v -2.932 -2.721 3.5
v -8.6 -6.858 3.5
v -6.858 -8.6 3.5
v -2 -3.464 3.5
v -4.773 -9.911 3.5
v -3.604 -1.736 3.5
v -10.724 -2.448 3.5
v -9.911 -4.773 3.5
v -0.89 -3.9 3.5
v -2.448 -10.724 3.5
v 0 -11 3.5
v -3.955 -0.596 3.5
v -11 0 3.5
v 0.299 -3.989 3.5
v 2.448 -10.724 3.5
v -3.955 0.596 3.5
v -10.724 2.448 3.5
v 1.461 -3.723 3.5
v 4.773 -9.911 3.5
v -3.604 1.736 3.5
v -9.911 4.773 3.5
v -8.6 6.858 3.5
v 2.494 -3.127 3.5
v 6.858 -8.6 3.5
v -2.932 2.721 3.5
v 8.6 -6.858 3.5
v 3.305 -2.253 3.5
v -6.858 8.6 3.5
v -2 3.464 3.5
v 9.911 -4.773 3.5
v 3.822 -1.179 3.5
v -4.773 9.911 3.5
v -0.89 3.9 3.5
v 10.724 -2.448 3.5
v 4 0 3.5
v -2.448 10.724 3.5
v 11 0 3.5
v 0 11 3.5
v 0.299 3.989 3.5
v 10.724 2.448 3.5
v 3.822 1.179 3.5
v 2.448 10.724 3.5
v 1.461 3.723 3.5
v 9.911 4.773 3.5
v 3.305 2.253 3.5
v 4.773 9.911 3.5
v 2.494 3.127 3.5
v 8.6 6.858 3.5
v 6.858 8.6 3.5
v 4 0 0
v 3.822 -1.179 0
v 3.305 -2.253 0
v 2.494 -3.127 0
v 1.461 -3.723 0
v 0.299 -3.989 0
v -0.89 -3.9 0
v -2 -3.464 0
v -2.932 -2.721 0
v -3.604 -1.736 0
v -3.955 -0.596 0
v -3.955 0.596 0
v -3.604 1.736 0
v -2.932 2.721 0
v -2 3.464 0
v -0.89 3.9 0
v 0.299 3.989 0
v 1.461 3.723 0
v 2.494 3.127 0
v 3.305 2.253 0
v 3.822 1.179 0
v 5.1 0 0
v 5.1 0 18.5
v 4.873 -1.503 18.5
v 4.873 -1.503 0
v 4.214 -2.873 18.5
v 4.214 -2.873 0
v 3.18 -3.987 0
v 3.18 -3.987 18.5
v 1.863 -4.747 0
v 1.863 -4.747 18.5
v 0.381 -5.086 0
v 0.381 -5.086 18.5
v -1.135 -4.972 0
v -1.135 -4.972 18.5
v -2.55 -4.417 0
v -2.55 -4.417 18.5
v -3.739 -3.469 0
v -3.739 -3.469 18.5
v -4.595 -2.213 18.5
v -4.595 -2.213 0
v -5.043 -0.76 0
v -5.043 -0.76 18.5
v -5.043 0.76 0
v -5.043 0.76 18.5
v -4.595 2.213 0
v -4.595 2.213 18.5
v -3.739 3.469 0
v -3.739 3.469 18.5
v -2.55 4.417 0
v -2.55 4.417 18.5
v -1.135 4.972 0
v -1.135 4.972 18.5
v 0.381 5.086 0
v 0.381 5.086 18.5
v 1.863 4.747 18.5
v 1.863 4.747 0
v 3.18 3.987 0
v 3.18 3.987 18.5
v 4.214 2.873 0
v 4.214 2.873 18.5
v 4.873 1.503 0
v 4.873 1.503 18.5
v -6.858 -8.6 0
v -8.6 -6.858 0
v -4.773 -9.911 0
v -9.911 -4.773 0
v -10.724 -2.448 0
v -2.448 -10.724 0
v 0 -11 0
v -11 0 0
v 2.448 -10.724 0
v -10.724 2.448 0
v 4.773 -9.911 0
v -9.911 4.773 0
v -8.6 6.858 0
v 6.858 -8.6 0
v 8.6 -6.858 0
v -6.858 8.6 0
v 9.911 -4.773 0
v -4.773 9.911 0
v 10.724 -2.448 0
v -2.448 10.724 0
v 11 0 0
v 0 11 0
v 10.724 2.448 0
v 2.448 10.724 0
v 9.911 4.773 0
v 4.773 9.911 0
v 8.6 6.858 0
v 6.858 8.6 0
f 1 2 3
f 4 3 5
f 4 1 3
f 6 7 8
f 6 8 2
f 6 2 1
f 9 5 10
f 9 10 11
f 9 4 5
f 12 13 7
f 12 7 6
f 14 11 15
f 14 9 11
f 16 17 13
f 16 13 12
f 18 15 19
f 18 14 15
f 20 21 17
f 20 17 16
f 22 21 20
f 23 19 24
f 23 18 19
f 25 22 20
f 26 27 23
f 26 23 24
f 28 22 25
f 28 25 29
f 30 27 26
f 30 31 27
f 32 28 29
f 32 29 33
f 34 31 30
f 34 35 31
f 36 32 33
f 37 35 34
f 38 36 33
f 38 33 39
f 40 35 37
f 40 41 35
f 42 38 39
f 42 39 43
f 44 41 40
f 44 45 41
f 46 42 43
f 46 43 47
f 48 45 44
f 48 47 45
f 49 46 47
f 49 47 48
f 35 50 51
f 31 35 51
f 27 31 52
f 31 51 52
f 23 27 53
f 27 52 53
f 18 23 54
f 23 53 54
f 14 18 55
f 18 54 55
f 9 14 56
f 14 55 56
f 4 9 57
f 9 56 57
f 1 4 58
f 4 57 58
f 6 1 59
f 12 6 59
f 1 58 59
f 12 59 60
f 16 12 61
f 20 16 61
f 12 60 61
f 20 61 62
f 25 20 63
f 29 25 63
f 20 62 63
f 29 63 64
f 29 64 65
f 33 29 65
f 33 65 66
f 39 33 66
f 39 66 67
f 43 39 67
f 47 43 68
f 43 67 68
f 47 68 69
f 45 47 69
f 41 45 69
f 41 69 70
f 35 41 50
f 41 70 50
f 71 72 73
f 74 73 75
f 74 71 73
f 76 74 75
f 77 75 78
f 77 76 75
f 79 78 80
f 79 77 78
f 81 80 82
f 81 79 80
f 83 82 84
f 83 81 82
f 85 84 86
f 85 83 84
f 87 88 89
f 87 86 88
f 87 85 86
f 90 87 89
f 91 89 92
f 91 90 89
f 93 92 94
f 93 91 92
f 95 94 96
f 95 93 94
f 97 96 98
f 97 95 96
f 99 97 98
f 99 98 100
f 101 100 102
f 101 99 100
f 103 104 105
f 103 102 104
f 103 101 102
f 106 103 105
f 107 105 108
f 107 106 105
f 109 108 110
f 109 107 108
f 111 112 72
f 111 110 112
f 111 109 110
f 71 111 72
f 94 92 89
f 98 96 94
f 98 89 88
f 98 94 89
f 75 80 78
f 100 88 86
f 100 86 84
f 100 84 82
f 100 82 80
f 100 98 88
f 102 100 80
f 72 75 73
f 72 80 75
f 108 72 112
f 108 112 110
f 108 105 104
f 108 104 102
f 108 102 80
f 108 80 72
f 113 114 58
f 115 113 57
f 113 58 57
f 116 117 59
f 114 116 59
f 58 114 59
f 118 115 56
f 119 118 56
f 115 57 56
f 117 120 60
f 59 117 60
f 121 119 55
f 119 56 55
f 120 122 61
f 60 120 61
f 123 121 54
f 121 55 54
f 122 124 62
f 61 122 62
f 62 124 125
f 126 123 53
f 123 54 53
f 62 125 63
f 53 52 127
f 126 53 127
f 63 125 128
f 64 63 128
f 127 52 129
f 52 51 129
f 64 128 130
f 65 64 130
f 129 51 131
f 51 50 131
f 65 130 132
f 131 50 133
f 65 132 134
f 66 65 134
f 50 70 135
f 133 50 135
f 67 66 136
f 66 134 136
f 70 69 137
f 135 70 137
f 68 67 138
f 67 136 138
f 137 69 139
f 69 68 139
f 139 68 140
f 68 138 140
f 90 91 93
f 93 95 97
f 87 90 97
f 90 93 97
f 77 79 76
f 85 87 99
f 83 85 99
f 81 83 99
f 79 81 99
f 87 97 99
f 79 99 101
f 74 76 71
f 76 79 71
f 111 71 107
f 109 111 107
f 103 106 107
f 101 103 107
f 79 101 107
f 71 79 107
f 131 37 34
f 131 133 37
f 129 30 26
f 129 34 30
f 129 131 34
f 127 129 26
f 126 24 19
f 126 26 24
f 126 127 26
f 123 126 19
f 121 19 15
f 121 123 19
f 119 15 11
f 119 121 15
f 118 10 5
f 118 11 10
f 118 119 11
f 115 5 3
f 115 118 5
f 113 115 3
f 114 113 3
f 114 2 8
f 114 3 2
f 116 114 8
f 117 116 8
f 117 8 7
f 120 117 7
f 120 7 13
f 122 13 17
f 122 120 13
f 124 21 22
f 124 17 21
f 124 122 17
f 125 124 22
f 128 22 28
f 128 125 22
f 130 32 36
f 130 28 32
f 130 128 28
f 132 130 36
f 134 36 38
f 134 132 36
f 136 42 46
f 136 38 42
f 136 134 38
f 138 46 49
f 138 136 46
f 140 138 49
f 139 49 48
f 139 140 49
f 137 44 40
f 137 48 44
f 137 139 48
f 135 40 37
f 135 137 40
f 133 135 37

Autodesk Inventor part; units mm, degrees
ref_plane "YZ Plane" through (0, 0, 0) normal (1, 0, 0) x (0, 1, 0)
ref_plane "XZ Plane" through (0, 0, 0) normal (0, 1, 0) x (-1, 0, 0)
ref_plane "XY Plane" through (0, 0, 0) normal (0, 0, 1) x (1, 0, 0)
sketch "Skizze1" plane through (0, 0, 0) normal (0, 0, 1) x (1, 0, 0)
  circle A0 centre (0, 0) radius 11
extrude "Extrusion1" add sketch "Skizze1" along normal blind 3.5
sketch "Skizze2" plane through (0, 0, 0) normal (0, 0, 1) x (1, 0, 0)
  circle A0 centre (0, 0) radius 5.1
extrude "Extrusion2" add sketch "Skizze2" along normal blind 18.5 separate body
sketch "Skizze3" plane through (0, 0, 0) normal (0, 0, 1) x (1, 0, 0)
  circle A0 centre (0, 0) radius 4
extrude "Extrusion3" cut sketch "Skizze3" along normal blind 19 bodies 1
properties part number "T8_Mutter"
